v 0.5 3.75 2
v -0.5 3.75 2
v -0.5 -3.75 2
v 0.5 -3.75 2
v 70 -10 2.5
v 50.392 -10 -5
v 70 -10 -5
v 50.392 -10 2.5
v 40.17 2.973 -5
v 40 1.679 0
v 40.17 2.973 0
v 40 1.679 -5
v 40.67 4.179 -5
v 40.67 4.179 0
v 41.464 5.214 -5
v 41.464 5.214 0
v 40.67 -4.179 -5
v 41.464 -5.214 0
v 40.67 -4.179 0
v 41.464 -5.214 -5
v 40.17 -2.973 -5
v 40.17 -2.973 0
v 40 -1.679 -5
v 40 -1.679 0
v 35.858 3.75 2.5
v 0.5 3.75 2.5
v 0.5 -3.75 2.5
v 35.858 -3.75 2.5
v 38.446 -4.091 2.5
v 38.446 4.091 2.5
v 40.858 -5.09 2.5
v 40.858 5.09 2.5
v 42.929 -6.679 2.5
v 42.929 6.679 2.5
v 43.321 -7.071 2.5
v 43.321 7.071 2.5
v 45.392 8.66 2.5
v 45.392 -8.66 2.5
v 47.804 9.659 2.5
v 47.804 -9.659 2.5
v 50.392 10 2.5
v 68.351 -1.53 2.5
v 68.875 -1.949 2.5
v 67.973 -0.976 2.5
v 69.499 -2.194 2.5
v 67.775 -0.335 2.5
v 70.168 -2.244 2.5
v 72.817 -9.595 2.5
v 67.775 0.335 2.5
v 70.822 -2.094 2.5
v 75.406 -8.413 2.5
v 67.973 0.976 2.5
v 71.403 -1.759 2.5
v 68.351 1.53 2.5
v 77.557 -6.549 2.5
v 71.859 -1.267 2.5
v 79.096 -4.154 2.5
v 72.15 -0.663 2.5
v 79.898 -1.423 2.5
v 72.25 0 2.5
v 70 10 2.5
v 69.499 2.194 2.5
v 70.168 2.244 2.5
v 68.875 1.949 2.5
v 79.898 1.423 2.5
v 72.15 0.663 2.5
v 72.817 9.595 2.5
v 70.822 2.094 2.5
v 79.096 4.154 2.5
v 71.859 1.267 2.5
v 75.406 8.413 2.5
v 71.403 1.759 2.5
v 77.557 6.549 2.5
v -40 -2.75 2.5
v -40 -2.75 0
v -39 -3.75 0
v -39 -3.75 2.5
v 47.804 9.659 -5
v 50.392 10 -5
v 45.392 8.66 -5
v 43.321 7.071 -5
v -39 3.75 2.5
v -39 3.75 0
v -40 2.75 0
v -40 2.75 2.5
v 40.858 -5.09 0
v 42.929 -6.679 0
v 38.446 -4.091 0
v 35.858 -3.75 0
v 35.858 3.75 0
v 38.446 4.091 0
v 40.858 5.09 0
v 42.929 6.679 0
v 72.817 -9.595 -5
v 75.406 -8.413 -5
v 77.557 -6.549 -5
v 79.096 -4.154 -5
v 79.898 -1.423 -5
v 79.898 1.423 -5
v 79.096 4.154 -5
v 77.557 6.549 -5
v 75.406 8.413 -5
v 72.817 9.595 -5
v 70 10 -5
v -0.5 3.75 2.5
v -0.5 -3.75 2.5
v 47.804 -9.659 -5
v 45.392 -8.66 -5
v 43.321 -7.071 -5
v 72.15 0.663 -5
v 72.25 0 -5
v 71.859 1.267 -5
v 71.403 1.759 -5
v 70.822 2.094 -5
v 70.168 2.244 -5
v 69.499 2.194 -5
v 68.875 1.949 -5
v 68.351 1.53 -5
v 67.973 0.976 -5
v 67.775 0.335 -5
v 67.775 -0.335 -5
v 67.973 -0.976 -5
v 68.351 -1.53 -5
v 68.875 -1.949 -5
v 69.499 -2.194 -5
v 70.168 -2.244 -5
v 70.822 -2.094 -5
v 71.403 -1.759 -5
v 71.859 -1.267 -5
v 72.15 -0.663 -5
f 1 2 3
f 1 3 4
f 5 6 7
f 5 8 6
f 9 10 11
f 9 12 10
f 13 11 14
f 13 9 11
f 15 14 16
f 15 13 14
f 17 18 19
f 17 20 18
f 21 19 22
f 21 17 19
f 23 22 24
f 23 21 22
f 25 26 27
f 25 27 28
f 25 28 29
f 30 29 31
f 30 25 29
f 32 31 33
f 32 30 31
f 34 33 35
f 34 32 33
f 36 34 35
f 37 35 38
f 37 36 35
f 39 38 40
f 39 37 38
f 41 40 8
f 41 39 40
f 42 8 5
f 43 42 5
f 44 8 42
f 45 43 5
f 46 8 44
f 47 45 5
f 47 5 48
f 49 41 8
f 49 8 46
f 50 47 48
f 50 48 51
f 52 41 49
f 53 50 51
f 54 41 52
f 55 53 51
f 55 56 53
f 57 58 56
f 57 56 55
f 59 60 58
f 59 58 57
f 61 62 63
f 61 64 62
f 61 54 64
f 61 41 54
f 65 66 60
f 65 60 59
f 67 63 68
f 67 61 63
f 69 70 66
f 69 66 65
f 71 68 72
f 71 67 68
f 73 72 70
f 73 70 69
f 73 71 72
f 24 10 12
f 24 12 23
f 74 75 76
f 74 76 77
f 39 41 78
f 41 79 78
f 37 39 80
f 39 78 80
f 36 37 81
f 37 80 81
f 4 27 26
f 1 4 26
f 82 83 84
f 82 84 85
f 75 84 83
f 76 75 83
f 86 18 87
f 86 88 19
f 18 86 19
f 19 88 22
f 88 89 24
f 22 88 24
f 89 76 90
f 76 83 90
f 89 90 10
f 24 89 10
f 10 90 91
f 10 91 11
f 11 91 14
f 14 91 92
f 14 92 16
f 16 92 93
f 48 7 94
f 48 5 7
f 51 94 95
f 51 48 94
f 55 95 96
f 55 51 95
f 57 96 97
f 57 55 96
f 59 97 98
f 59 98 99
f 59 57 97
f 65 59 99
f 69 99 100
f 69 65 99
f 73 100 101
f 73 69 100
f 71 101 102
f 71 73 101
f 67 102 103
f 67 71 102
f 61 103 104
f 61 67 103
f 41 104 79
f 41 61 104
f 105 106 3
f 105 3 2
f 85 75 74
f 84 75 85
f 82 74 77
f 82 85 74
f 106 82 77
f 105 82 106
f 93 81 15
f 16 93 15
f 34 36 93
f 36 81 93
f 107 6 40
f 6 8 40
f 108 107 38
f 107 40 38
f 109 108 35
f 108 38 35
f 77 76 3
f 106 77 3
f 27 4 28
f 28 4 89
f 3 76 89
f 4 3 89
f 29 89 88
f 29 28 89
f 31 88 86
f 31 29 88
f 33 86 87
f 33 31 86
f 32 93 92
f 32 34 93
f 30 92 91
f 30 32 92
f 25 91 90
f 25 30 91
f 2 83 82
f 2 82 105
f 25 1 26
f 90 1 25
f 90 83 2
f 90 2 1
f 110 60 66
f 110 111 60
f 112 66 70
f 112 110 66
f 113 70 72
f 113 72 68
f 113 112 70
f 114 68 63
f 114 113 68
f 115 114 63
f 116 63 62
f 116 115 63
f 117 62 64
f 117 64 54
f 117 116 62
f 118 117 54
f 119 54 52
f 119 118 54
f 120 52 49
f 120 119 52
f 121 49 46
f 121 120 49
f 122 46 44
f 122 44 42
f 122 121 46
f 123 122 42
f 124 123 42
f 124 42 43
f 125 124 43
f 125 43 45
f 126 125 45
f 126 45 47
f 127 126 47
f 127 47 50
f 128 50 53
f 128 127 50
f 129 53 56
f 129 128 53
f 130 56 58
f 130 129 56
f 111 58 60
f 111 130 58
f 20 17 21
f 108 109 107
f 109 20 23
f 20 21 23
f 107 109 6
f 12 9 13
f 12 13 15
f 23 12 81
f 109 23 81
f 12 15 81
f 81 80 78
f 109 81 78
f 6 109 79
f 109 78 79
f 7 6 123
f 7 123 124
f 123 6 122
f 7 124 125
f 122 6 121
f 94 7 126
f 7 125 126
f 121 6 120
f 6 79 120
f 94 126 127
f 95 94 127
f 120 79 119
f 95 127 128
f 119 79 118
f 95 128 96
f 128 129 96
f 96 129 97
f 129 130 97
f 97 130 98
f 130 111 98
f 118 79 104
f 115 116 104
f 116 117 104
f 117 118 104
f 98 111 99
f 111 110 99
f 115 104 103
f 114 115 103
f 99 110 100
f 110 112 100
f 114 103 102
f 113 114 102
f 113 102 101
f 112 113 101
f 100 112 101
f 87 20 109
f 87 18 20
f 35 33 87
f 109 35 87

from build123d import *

# Parameters (mm, degrees)
F0_W     = 80
F0_H     = 7.5
F0_R     = 2.25
F1_DEPTH = 2.5
F2_DEPTH = 5
F3_SIZE  = 1
F4_R     = 10
F5_R     = 5
F6_W     = 1
F6_H     = 7.5
F7_DEPTH = 0.5


with BuildPart() as f1:
    # F0 (on Top) → F1 (new body)
    with BuildSketch(Plane.XY):
        Rectangle(F0_W, F0_H)
        with BuildLine():
            Line((46.25, 10), (40, 3.75))
            Line((40, 3.75), (40, -3.75))
            Line((40, -3.75), (46.25, -10))
            Line((46.25, -10), (70, -10))
            ThreePointArc((70, -10), (80, 0), (70, 10))
            Line((70, 10), (46.25, 10))
        make_face()
        with Locations((70, 0)):
            Circle(F0_R, mode=Mode.SUBTRACT)
    extrude(amount=F1_DEPTH)

    # F0 (on Top) → F2 (join)
    with BuildSketch(Plane.XY):
        with BuildLine():
            Line((46.25, 10), (40, 3.75))
            Line((40, 3.75), (40, -3.75))
            Line((40, -3.75), (46.25, -10))
            Line((46.25, -10), (70, -10))
            ThreePointArc((70, -10), (80, 0), (70, 10))
            Line((70, 10), (46.25, 10))
        make_face()
        with Locations((70, 0)):
            Circle(F0_R, mode=Mode.SUBTRACT)
    extrude(amount=-F2_DEPTH)

    # F3
    f3_edges = [f1.edges().sort_by_distance(p)[0] for p in [
        (-40, -3.75, 1.25),
        (-40, 3.75, 1.25),
    ]]
    chamfer(f3_edges, length=F3_SIZE)

    # F4
    f4_edges = [f1.edges().sort_by_distance(p)[0] for p in [
        (40, -3.75, 1.25),
        (46.25, -10, -1.25),
        (46.25, 10, -1.25),
        (40, 3.75, 1.25),
    ]]
    fillet(f4_edges, radius=F4_R)

    # F5
    f5_edges = [f1.edges().sort_by_distance(p)[0] for p in [
        (40, -3.75, -2.5),
        (40, 3.75, -2.5),
    ]]
    fillet(f5_edges, radius=F5_R)

    # F6 (on face) → F7 (cut)
    with BuildSketch(Plane.XY.offset(2.5)):
        Rectangle(F6_W, F6_H)
    extrude(amount=-F7_DEPTH, mode=Mode.SUBTRACT)


solid = f1.part
